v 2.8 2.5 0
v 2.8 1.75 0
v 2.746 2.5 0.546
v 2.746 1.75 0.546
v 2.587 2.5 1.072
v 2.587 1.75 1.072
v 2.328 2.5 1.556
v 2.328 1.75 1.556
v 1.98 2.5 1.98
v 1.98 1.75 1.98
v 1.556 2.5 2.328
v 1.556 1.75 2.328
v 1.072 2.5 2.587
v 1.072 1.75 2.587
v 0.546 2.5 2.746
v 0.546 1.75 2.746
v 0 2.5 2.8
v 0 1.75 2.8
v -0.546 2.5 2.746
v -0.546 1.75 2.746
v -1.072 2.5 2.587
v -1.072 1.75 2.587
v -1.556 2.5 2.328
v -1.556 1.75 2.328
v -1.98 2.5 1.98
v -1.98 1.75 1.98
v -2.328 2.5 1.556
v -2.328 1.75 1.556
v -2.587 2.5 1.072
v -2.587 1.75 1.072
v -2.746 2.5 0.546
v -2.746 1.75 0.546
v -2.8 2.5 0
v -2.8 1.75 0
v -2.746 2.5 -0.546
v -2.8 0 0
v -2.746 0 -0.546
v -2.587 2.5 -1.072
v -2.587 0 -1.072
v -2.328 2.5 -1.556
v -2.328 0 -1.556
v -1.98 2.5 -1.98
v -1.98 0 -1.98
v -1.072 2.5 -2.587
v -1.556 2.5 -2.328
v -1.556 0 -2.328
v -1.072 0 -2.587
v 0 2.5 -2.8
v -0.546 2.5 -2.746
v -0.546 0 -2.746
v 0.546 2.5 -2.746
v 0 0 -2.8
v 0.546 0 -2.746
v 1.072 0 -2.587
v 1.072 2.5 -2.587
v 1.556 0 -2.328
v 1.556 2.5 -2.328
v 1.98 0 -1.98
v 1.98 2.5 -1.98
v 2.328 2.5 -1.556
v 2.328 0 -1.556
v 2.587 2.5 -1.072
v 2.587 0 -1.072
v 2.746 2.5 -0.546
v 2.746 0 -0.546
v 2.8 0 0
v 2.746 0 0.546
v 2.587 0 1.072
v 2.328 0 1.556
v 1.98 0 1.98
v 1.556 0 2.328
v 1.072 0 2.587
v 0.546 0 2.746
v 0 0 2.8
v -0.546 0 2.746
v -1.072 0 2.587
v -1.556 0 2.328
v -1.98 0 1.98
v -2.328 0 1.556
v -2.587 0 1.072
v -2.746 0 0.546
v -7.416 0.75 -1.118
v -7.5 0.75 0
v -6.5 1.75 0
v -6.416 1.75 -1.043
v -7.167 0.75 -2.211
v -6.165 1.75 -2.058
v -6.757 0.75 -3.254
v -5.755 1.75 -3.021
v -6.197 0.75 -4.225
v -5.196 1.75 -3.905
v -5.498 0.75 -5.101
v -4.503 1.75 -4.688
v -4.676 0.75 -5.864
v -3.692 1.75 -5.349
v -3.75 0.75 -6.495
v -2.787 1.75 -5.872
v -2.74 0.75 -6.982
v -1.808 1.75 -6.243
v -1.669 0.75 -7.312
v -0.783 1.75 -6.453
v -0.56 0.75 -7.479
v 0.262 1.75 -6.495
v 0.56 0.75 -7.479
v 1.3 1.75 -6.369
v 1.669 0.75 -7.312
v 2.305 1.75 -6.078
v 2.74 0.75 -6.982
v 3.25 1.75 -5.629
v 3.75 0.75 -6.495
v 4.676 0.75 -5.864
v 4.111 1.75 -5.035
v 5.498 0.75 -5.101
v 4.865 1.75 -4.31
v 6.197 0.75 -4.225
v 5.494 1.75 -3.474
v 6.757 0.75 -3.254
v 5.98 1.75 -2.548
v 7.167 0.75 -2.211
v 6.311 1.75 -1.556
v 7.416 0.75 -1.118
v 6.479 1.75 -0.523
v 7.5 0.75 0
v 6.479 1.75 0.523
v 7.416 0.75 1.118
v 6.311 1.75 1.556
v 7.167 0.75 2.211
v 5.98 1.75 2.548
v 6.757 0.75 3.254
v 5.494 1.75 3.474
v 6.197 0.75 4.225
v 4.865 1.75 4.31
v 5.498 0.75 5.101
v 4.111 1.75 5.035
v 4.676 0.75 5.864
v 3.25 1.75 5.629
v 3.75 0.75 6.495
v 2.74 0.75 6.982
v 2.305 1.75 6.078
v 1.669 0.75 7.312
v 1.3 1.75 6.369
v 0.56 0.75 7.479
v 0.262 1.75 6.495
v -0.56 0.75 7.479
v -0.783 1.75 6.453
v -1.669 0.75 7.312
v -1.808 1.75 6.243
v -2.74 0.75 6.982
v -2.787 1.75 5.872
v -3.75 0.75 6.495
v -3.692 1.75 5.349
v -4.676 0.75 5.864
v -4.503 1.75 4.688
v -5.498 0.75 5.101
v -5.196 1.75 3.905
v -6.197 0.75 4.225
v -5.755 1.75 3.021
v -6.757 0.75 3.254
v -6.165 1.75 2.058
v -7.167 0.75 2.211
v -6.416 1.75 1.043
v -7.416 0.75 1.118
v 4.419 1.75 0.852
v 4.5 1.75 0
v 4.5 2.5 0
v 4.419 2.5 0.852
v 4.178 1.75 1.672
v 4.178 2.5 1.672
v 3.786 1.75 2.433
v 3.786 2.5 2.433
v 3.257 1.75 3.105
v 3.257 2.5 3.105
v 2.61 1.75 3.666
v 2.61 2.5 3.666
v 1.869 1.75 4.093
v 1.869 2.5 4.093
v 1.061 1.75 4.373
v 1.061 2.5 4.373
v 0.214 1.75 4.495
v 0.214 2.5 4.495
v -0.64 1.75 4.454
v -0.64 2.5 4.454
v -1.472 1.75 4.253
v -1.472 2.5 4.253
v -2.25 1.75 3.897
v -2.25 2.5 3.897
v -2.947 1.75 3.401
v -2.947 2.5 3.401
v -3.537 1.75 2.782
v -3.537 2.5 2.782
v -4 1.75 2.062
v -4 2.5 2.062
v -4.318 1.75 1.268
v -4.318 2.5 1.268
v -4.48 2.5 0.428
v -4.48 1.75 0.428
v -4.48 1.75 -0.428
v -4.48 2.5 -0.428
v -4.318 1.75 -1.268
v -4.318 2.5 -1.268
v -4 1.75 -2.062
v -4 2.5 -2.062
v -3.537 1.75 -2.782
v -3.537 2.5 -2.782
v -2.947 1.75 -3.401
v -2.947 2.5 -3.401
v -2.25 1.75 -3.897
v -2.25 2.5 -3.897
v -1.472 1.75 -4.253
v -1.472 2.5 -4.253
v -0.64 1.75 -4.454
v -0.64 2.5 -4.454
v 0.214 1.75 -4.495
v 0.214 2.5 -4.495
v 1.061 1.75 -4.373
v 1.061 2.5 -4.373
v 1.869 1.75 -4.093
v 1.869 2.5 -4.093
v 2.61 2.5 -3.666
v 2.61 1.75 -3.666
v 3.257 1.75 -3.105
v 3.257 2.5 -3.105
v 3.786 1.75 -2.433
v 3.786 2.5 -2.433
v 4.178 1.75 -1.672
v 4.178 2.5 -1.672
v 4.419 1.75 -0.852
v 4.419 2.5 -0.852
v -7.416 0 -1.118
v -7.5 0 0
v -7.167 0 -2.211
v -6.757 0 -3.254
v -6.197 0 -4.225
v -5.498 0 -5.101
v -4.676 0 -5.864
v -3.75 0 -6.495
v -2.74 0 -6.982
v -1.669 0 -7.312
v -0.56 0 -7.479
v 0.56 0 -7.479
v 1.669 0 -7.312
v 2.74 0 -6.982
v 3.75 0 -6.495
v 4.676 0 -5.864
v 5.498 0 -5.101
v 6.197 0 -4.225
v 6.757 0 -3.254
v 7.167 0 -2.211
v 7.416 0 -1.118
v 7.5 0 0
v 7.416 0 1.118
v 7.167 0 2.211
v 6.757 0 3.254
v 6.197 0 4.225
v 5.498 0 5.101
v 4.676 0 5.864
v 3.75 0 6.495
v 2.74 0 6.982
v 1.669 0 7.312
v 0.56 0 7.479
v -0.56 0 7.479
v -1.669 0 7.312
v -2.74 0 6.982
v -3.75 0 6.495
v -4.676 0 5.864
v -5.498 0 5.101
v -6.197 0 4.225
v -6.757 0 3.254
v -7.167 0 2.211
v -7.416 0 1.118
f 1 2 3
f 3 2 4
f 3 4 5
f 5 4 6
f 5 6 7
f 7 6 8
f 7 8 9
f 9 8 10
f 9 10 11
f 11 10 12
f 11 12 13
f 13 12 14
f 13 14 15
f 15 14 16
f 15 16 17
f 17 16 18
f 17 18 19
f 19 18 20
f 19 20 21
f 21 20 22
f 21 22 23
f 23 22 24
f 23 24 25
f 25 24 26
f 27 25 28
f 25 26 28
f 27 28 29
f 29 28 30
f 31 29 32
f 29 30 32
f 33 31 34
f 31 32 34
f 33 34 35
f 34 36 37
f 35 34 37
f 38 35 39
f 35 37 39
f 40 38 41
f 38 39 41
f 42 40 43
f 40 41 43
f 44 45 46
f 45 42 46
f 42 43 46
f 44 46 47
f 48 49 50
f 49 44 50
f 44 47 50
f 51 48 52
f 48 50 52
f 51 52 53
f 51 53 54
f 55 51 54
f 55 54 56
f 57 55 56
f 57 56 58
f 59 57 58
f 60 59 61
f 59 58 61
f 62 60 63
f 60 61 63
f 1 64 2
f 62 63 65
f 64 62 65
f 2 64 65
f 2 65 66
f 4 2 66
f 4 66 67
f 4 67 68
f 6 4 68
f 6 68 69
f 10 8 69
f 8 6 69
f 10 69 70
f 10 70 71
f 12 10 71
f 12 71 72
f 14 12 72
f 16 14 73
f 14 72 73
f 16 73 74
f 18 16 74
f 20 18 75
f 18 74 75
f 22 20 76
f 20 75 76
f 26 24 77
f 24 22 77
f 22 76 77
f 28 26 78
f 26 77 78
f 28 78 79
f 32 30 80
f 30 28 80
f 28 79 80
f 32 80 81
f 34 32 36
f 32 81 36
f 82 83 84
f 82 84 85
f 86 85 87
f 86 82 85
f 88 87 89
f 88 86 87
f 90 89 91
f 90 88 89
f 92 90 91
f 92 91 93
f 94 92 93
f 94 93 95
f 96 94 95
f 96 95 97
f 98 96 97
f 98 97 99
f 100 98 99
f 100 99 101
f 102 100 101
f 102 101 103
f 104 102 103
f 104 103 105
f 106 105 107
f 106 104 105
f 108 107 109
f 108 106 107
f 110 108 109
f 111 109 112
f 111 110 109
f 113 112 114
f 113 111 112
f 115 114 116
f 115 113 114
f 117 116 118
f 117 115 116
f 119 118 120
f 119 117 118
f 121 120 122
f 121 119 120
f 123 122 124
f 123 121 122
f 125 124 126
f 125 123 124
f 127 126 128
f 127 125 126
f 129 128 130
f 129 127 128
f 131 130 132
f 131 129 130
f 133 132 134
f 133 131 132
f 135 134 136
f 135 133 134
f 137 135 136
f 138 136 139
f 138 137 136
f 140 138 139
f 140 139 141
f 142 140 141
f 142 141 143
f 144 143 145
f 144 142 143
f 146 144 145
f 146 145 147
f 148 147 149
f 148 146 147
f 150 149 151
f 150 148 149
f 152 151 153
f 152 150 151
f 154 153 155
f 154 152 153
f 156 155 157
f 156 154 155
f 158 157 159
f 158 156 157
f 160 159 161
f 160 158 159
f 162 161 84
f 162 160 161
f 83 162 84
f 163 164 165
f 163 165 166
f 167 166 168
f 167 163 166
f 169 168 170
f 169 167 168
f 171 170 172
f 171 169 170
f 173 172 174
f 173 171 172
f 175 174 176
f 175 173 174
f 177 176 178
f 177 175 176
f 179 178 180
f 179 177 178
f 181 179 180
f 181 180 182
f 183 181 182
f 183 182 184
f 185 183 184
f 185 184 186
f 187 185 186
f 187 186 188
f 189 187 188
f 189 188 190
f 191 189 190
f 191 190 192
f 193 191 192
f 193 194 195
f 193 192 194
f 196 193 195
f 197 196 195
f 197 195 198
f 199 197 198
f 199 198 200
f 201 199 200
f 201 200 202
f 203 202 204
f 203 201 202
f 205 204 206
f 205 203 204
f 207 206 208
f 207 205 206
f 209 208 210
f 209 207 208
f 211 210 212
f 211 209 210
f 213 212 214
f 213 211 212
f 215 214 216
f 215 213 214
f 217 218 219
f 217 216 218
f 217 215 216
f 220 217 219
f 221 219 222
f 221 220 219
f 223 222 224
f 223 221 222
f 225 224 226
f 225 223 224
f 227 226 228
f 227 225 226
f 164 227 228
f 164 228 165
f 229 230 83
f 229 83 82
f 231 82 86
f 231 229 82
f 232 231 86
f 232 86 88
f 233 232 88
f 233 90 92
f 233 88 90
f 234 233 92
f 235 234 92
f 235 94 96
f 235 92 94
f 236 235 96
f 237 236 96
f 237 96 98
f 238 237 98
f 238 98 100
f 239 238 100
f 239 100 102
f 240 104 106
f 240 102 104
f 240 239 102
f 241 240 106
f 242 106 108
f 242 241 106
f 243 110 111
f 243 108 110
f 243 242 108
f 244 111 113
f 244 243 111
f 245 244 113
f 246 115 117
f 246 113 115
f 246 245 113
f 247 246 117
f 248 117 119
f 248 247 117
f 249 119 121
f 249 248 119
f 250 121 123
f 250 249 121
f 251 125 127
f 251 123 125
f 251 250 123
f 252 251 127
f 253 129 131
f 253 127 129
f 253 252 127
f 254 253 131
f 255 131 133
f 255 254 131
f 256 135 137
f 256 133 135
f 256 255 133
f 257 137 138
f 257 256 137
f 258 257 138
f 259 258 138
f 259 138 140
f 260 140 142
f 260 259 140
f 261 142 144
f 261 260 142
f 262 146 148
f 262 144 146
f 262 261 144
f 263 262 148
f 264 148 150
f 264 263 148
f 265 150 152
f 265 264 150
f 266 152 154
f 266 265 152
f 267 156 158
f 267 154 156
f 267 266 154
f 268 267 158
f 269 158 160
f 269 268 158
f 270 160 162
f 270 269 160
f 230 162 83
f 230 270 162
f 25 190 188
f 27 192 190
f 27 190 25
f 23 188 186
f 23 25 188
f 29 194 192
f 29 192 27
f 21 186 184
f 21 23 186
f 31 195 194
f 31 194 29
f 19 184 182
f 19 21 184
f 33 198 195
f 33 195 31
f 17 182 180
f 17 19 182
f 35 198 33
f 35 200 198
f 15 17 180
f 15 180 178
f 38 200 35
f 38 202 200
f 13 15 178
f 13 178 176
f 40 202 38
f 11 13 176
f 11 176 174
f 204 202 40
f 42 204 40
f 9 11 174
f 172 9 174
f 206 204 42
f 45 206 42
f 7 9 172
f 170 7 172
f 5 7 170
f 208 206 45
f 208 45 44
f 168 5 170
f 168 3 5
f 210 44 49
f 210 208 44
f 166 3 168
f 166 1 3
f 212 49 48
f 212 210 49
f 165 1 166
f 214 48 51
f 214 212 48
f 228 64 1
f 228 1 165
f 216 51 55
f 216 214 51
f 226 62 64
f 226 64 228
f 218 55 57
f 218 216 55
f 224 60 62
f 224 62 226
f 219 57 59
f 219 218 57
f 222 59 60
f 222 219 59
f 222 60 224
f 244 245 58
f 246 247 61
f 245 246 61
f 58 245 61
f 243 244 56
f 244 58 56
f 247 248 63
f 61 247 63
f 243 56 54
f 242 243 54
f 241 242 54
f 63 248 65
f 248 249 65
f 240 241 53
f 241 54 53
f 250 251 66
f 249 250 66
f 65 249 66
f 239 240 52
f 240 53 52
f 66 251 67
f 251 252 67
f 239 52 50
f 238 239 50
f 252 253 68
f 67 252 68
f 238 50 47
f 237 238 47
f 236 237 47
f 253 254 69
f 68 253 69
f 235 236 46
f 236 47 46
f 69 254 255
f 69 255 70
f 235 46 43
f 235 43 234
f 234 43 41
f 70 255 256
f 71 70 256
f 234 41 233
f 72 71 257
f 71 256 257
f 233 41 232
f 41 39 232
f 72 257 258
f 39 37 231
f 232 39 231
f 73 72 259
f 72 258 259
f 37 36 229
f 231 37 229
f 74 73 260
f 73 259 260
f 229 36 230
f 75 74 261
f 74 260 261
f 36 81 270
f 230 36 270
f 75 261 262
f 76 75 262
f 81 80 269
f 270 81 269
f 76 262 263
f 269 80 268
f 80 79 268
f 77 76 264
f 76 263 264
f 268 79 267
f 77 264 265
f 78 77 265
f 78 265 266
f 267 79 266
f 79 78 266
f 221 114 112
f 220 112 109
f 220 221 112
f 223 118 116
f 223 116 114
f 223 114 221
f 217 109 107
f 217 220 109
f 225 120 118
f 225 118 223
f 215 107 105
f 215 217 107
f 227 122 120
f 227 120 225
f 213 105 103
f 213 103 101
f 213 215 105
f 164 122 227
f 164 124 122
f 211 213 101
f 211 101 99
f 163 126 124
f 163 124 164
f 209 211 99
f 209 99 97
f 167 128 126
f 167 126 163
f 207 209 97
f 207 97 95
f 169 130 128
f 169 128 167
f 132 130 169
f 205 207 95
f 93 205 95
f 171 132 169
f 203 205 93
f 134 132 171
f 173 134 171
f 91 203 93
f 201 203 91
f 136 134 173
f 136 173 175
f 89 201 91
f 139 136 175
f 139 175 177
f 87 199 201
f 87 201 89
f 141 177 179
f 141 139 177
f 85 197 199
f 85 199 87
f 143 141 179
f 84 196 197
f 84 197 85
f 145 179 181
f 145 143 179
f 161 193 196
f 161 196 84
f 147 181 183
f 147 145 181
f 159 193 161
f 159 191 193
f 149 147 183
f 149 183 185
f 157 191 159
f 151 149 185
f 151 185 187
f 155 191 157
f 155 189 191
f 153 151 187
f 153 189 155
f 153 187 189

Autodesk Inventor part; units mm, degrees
ref_plane "YZ Plane" through (0, 0, 0) normal (1, 0, 0) x (0, 1, 0)
ref_plane "XZ Plane" through (0, 0, 0) normal (0, 1, 0) x (-1, 0, 0)
ref_plane "XY Plane" through (0, 0, 0) normal (0, 0, 1) x (1, 0, 0)
sketch "Sketch1" plane through (0, 0, 0) normal (0, 1, 0) x (-1, 0, 0)
  circle A0 centre (0, 0) radius 2.8
  circle A1 centre (0, 0) radius 7.5
  dimension "d0" = 5.6
  dimension "d1" = 15
extrude "Extrusion1" add sketch "Sketch1" along normal blind 1.75
sketch "Sketch2" plane through (0, 1.75, 0) normal (0, 1, 0) x (1, 0, 0)
  circle A0 centre (0, 0) radius 4.5
  circle A1 centre (0, 0) radius 2.8 projected
  dimension "d4" = 9
extrude "Extrusion2" add sketch "Sketch2" along normal blind 0.75
chamfer "Chamfer1" distance 1 angle 45 1 edges at (7.5, 1.75, 0)
properties part number "x carraige sliding spacer short" material "ABS Plastic"
